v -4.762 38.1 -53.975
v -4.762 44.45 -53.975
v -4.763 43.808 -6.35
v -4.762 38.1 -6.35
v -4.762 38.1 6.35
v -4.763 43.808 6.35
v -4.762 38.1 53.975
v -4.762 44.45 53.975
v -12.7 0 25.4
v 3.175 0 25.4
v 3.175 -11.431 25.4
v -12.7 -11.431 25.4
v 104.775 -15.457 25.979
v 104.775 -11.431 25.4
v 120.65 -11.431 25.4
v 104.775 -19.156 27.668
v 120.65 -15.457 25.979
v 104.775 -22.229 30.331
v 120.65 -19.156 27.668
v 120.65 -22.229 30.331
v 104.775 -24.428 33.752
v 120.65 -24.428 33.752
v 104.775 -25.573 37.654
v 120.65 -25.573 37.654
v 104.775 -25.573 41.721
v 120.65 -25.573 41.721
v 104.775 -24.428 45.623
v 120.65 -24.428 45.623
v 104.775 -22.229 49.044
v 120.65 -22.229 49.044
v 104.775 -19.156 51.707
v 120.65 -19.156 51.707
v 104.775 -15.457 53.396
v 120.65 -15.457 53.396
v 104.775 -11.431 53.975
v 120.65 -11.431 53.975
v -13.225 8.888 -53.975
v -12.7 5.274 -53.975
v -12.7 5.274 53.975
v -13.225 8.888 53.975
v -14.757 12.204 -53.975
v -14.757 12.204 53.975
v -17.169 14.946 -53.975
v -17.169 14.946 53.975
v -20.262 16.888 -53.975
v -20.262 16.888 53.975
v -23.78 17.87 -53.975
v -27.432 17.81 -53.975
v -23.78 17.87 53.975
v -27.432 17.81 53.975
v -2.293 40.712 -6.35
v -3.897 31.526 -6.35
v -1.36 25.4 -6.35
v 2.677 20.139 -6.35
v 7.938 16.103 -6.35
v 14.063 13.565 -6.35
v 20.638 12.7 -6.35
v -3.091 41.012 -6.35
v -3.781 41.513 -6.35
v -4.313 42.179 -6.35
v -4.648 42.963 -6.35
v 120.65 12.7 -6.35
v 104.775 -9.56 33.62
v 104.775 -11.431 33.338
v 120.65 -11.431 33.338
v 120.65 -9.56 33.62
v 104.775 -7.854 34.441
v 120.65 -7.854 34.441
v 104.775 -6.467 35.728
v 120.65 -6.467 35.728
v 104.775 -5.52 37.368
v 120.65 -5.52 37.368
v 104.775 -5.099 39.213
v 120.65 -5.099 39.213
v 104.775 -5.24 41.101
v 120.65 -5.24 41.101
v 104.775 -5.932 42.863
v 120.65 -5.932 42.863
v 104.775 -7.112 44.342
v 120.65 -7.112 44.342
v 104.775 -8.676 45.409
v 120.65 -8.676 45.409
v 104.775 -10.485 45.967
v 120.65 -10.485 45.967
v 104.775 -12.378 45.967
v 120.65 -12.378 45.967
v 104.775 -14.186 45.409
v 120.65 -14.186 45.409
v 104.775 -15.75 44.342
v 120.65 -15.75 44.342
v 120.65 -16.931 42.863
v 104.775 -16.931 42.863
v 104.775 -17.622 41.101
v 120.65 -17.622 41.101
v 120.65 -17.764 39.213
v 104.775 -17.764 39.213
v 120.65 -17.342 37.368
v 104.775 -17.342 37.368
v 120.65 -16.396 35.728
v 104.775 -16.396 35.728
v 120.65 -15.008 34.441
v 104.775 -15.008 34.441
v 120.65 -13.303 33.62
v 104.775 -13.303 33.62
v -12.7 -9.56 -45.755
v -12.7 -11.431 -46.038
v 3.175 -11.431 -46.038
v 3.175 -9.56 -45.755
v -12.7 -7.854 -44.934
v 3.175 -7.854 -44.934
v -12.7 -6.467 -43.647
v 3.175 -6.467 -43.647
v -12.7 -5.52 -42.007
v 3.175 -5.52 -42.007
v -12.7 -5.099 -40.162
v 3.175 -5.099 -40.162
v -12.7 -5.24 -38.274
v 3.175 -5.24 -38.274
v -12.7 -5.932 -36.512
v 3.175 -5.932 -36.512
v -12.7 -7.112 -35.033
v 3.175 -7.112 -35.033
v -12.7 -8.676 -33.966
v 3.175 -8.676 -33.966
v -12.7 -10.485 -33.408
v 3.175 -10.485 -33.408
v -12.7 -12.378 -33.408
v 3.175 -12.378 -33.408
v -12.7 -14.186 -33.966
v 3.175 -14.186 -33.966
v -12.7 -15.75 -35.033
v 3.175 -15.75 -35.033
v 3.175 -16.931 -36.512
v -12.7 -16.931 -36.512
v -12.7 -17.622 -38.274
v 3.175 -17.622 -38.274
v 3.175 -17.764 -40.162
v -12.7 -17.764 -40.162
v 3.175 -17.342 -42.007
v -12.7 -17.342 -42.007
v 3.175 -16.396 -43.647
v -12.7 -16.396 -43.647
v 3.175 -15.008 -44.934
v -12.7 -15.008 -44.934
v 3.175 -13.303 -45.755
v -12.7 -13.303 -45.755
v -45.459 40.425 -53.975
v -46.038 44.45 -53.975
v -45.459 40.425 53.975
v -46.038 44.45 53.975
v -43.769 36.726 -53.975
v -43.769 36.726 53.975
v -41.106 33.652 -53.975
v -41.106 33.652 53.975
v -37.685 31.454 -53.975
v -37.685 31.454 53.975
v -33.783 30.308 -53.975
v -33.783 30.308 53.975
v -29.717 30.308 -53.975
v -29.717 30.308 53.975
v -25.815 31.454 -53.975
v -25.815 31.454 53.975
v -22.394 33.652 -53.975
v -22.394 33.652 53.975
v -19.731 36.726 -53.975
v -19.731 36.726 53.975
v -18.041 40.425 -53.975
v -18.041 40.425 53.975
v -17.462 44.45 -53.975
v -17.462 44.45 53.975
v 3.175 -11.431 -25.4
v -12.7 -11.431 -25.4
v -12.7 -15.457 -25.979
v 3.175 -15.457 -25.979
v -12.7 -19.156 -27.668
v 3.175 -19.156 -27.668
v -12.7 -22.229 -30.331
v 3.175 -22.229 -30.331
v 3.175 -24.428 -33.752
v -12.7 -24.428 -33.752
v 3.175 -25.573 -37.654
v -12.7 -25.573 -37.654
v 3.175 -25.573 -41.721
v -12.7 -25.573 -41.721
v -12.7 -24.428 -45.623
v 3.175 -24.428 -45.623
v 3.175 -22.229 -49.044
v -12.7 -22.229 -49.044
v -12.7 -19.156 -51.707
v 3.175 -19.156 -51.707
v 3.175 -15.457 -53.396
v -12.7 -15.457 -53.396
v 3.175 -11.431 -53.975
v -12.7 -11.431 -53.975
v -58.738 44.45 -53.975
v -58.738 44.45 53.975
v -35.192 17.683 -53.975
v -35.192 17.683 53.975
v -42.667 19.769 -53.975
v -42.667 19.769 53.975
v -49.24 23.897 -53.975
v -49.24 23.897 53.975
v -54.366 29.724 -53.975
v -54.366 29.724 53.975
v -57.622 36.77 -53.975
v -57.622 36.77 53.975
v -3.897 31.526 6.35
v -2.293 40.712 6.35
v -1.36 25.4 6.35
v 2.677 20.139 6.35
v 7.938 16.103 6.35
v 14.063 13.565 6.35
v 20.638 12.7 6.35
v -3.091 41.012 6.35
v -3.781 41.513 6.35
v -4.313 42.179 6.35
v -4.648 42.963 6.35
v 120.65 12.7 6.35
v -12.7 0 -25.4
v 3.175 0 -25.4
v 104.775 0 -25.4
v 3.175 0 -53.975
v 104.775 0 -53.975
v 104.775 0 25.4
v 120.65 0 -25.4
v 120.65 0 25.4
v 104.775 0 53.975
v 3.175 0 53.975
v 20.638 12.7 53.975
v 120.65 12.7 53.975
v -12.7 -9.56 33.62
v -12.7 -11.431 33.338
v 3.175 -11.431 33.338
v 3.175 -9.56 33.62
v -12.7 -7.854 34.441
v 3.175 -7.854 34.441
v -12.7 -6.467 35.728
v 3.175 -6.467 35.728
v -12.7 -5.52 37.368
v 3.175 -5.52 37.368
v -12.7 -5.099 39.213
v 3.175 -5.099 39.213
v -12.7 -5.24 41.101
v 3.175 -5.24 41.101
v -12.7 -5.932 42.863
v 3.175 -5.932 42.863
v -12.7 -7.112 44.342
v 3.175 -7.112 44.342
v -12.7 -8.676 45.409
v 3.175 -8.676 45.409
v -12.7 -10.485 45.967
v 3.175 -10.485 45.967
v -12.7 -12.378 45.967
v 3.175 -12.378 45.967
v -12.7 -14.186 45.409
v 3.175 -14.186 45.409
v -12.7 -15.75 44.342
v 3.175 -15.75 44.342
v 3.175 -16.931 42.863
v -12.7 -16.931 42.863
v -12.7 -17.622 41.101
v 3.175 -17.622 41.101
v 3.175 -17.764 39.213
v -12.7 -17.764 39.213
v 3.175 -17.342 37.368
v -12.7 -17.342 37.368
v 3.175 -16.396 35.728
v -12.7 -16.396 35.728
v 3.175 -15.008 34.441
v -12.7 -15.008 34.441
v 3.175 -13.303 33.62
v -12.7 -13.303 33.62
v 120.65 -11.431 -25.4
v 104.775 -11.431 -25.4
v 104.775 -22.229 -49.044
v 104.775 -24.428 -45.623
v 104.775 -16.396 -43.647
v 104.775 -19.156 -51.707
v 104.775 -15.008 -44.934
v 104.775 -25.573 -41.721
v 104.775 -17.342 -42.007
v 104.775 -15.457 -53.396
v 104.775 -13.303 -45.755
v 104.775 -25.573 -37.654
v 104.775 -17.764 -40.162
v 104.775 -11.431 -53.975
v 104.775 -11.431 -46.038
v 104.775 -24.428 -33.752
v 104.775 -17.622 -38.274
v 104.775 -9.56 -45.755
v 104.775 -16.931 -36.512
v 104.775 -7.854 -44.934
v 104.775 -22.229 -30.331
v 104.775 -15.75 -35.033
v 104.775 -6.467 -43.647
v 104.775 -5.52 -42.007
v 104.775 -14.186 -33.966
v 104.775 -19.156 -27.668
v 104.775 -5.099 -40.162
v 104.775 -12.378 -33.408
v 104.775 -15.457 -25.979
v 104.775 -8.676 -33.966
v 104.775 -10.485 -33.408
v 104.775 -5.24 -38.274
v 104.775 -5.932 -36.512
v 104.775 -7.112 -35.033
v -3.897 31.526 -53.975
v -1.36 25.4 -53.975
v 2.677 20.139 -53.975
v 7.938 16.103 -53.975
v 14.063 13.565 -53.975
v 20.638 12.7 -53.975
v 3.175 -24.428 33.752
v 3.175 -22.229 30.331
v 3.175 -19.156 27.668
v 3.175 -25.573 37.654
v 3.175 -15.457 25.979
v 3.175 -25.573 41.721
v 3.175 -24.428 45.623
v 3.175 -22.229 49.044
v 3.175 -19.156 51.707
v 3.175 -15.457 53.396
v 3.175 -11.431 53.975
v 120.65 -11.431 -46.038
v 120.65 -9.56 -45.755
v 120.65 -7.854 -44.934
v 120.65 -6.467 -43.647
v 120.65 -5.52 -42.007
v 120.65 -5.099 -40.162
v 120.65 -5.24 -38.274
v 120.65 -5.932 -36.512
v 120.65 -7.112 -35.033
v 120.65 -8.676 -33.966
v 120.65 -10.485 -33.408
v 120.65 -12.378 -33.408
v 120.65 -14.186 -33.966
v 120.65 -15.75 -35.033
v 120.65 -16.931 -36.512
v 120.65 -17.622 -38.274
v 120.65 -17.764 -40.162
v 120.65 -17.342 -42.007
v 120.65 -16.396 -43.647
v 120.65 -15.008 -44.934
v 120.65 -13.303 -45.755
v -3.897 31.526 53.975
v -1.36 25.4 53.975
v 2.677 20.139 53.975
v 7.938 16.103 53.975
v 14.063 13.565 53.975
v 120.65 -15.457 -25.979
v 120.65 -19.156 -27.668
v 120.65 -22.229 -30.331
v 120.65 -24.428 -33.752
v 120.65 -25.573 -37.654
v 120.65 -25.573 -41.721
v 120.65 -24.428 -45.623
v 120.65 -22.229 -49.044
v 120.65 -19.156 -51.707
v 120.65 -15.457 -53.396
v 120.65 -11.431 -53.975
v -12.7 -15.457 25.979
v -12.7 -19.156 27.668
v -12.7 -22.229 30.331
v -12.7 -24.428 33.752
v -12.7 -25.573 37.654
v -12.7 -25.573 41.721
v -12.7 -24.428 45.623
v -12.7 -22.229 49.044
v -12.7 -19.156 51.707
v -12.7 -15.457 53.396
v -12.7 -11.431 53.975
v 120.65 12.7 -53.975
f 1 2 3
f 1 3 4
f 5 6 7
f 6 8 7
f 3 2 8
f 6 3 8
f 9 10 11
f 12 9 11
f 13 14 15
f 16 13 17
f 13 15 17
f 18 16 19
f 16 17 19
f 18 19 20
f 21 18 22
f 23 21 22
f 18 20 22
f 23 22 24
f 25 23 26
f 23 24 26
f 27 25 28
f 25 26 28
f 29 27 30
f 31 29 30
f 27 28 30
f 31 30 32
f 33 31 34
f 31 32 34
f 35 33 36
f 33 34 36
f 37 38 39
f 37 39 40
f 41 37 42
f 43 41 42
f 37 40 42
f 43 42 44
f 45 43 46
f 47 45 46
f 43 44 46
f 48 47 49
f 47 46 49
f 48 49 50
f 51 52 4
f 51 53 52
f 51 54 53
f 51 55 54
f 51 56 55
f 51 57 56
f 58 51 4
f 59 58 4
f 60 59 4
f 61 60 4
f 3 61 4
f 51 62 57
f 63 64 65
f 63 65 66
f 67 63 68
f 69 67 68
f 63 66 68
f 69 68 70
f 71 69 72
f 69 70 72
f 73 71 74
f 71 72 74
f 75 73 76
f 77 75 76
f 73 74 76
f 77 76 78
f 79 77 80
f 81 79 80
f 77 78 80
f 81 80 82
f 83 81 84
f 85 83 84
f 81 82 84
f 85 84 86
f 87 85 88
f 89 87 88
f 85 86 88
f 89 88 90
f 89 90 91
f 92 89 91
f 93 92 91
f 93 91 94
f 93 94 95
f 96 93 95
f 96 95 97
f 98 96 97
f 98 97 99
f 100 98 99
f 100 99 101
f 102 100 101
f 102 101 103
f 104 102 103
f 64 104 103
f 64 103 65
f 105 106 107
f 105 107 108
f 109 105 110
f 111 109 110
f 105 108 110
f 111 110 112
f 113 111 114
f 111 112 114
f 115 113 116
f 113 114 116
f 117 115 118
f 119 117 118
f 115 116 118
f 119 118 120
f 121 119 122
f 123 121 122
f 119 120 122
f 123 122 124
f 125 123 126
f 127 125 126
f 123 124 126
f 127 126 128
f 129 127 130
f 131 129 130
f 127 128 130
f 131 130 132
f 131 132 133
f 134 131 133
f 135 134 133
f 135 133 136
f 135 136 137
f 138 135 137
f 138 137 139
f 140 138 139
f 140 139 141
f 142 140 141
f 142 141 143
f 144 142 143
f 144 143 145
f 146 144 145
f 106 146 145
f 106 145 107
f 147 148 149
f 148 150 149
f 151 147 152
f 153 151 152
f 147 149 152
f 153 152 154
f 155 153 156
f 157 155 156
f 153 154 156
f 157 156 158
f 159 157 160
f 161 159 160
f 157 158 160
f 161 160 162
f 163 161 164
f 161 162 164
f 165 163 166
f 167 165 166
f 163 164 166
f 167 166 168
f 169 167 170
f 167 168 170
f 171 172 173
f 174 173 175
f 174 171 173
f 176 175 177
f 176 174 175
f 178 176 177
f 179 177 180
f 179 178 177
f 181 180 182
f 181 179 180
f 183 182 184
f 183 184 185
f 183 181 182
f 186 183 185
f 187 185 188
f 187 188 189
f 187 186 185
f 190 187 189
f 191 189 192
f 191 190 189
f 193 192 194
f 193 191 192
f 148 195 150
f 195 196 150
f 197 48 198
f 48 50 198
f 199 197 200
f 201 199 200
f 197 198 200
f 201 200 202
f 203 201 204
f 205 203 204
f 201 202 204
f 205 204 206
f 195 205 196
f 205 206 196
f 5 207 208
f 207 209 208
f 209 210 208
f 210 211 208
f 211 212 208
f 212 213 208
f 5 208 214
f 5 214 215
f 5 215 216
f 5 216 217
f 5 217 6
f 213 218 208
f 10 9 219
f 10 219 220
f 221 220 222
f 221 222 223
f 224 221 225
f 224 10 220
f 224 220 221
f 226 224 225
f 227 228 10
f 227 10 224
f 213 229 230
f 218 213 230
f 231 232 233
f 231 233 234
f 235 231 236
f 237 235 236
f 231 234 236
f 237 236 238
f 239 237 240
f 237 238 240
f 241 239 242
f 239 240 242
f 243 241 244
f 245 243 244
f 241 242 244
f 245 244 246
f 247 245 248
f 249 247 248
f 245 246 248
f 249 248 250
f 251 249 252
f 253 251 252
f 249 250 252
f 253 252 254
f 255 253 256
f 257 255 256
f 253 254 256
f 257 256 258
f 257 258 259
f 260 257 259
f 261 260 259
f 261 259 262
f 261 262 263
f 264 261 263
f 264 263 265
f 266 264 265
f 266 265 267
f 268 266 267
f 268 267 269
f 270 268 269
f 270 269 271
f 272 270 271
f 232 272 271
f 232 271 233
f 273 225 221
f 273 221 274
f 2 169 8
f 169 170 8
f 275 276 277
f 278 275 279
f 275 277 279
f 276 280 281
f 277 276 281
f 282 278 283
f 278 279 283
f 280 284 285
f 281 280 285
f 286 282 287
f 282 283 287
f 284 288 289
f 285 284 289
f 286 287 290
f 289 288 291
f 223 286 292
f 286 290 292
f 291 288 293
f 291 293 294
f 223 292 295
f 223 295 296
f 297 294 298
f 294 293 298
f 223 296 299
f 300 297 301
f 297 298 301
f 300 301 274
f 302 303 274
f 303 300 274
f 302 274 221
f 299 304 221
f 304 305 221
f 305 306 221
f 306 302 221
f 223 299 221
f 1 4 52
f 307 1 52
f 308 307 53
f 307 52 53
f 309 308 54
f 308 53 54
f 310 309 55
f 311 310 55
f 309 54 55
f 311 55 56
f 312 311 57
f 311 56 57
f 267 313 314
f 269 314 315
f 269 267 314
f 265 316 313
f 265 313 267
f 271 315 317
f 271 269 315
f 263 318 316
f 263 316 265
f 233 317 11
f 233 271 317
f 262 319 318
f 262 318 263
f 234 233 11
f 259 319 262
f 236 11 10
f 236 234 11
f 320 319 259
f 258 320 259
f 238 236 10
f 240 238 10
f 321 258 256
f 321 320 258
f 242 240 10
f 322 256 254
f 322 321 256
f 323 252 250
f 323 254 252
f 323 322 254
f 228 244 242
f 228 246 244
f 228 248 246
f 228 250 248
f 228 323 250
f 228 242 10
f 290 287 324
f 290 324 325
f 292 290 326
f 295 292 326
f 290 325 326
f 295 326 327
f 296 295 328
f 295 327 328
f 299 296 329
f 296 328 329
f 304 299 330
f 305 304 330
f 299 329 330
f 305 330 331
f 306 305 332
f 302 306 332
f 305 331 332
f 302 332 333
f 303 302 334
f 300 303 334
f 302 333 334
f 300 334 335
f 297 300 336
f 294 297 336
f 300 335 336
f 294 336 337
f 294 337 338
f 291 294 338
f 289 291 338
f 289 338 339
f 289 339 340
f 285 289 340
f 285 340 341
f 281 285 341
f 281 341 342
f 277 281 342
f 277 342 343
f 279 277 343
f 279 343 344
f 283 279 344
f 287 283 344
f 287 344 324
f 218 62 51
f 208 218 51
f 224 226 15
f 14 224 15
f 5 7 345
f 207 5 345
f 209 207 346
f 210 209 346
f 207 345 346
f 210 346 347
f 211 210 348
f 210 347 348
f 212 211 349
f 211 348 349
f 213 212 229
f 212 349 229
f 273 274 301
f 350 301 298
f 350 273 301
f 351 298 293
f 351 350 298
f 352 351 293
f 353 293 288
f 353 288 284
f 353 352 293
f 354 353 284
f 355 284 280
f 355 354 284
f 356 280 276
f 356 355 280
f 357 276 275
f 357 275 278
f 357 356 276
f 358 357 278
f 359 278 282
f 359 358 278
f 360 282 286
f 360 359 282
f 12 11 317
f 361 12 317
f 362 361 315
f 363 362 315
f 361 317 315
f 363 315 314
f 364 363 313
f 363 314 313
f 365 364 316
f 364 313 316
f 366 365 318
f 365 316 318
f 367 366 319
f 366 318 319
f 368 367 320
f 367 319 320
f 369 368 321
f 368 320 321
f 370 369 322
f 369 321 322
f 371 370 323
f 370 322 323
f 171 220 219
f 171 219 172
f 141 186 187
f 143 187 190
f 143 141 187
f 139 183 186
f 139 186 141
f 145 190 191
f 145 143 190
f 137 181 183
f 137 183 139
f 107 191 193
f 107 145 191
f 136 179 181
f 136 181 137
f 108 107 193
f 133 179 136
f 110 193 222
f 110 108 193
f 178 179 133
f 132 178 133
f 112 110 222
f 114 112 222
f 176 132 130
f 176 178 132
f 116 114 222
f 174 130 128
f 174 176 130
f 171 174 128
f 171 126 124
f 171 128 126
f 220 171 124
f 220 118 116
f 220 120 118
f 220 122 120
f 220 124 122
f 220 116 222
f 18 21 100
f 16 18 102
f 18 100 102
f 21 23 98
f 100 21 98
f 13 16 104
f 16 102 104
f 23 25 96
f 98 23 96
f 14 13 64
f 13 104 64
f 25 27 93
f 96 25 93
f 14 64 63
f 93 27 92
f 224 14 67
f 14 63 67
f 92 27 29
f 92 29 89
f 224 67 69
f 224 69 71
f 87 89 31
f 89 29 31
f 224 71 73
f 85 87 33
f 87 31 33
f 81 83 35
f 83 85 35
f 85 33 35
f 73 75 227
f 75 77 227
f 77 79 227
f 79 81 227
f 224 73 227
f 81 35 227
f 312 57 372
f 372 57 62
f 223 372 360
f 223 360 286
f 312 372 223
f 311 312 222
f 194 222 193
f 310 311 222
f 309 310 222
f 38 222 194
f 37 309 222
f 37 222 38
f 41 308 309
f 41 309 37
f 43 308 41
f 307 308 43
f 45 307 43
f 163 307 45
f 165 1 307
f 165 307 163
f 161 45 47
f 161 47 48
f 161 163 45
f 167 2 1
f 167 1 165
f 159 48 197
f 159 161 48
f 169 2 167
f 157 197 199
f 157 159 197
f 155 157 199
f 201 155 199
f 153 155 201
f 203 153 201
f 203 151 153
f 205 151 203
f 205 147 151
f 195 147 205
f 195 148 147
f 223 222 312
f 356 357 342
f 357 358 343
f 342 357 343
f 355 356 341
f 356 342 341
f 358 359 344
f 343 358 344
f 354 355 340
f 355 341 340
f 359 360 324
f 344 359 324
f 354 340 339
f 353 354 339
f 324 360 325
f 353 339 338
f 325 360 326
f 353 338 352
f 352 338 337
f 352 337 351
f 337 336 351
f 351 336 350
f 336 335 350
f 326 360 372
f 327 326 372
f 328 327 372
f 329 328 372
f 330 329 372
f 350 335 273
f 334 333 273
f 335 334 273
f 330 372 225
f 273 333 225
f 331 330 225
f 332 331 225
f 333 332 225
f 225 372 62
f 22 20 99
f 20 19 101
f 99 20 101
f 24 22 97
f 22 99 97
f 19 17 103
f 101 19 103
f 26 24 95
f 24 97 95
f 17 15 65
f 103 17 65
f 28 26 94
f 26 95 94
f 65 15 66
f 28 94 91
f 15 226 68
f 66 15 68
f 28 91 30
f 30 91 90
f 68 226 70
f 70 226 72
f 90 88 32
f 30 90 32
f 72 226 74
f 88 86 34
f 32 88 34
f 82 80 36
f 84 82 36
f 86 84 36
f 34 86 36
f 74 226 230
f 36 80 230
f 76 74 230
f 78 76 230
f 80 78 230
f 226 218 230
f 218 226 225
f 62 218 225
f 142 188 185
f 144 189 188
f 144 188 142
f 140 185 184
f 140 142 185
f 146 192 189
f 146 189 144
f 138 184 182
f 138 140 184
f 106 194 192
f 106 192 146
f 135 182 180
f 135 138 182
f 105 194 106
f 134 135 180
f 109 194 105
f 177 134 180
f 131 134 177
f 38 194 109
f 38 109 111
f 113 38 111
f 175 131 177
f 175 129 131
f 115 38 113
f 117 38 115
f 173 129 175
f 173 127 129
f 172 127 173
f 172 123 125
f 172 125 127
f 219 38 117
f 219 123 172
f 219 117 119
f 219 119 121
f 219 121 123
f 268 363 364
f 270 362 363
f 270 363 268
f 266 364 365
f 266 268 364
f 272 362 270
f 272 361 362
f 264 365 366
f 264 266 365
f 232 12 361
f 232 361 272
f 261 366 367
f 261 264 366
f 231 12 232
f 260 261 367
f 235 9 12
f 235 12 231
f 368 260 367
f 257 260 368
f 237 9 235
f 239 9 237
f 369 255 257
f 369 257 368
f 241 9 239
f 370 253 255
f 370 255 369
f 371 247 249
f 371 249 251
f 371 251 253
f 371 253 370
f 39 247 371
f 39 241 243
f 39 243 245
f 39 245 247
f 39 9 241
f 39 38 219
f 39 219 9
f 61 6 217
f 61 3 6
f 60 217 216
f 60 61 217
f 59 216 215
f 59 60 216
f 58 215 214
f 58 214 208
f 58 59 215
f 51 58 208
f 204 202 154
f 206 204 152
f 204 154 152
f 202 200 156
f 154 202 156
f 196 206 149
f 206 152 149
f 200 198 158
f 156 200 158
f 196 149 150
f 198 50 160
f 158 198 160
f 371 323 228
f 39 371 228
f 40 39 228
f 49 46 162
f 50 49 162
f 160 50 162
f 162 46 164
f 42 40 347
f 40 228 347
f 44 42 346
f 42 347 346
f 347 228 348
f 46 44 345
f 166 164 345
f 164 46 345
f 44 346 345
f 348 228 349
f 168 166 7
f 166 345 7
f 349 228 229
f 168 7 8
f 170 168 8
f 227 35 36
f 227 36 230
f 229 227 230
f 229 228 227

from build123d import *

# Parameters (mm, degrees)
BOSS_EXTRUDE1_DEPTH = 53.975
SKETCH3_R           = 6.35
BOSS_EXTRUDE2_DEPTH = 133.35
SKETCH4_W           = 101.6
SKETCH4_H           = 25.718784162
CUT_EXTRUDE1_DEPTH  = 168.885161643
RIB3_REACH          = 141.447
SKETCH5_WALL_W      = 411.489550618
SKETCH5_WALL_H      = 12.7
FILLET1_R           = 3.175


with BuildPart() as part:
    # Sketch1 → Boss-Extrude1 (new, symmetric)
    with BuildSketch(Plane.XY):
        with BuildLine():
            Line((120.65, 0), (-12.7, 0))
            Line((-12.7, 0), (-12.7, 5.273793493))
            ThreePointArc((-12.7, 5.273793493), (-17.169459313, 14.945825338), (-27.432, 17.810179575))
            ThreePointArc((-27.432, 17.810179575), (-49.23989896, 23.896932331), (-58.7375, 44.45))
            Line((-58.7375, 44.45), (-46.0375, 44.45))
            ThreePointArc((-46.0375, 44.45), (-31.75, 30.1625), (-17.4625, 44.45))
            Line((-17.4625, 44.45), (-4.7625, 44.45))
            Line((-4.7625, 44.45), (-4.7625, 38.1))
            ThreePointArc((-4.7625, 38.1), (2.676987758, 20.139487758), (20.6375, 12.7))
            Line((20.6375, 12.7), (120.65, 12.7))
            Line((120.65, 12.7), (120.65, 0))
        make_face()
    extrude(amount=BOSS_EXTRUDE1_DEPTH, both=True)

    # Sketch3 → Boss-Extrude2 (add)
    with BuildSketch(Plane(origin=(120.65, 0, 0), x_dir=(0, 0, -1), z_dir=(1, 0, 0))):
        with BuildLine():
            Line((-53.975, -11.431284162), (-53.975, 0))
            Line((-53.975, 0), (-25.4, 0))
            Line((-25.4, 0), (-25.4, -11.431284162))
            ThreePointArc((-25.4, -11.431284162), (-39.6875, -25.718784162), (-53.975, -11.431284162))
        make_face()
        with Locations((-39.6875, -11.431284162)):
            Circle(SKETCH3_R, mode=Mode.SUBTRACT)
        with BuildLine():
            Line((53.975, 0), (25.4, 0))
            Line((25.4, 0), (25.4, -11.431284162))
            ThreePointArc((25.4, -11.431284162), (39.6875, -25.718784162), (53.975, -11.431284162))
            Line((53.975, -11.431284162), (53.975, 0))
        make_face()
        with Locations((39.6875, -11.431284162)):
            Circle(SKETCH3_R, mode=Mode.SUBTRACT)
    extrude(amount=-BOSS_EXTRUDE2_DEPTH)

    # Sketch4 → Cut-Extrude1 (cut, through all)
    with BuildSketch(Plane.XY.offset(53.975)):
        with Locations((53.975, -12.859392081)):
            Rectangle(SKETCH4_W, SKETCH4_H)
    extrude(amount=-CUT_EXTRUDE1_DEPTH, mode=Mode.SUBTRACT)

    # Sketch5 wall → Rib3 (add, up to next)
    with BuildSketch(Plane(origin=(56.984129031, 27.206147816, 0), x_dir=(-0.975011472973, 0.222154512832, 0), z_dir=(-0.222154512832, -0.975011472973, 0)), mode=Mode.PRIVATE) as rib3_sk1:
        Rectangle(SKETCH5_WALL_W, SKETCH5_WALL_H)
    rib3_tool1 = extrude(rib3_sk1.sketch, amount=RIB3_REACH, mode=Mode.PRIVATE) - part.part
    add(rib3_tool1.solids().sort_by_distance((56.984129031, 27.206147816, 0))[0])

    # Fillet1
    fillet1_edges = [part.edges().sort_by_distance(p)[0] for p in [
        (-4.7625, 41.275, 0),
    ]]
    fillet(fillet1_edges, radius=FILLET1_R)


solid = part.part
